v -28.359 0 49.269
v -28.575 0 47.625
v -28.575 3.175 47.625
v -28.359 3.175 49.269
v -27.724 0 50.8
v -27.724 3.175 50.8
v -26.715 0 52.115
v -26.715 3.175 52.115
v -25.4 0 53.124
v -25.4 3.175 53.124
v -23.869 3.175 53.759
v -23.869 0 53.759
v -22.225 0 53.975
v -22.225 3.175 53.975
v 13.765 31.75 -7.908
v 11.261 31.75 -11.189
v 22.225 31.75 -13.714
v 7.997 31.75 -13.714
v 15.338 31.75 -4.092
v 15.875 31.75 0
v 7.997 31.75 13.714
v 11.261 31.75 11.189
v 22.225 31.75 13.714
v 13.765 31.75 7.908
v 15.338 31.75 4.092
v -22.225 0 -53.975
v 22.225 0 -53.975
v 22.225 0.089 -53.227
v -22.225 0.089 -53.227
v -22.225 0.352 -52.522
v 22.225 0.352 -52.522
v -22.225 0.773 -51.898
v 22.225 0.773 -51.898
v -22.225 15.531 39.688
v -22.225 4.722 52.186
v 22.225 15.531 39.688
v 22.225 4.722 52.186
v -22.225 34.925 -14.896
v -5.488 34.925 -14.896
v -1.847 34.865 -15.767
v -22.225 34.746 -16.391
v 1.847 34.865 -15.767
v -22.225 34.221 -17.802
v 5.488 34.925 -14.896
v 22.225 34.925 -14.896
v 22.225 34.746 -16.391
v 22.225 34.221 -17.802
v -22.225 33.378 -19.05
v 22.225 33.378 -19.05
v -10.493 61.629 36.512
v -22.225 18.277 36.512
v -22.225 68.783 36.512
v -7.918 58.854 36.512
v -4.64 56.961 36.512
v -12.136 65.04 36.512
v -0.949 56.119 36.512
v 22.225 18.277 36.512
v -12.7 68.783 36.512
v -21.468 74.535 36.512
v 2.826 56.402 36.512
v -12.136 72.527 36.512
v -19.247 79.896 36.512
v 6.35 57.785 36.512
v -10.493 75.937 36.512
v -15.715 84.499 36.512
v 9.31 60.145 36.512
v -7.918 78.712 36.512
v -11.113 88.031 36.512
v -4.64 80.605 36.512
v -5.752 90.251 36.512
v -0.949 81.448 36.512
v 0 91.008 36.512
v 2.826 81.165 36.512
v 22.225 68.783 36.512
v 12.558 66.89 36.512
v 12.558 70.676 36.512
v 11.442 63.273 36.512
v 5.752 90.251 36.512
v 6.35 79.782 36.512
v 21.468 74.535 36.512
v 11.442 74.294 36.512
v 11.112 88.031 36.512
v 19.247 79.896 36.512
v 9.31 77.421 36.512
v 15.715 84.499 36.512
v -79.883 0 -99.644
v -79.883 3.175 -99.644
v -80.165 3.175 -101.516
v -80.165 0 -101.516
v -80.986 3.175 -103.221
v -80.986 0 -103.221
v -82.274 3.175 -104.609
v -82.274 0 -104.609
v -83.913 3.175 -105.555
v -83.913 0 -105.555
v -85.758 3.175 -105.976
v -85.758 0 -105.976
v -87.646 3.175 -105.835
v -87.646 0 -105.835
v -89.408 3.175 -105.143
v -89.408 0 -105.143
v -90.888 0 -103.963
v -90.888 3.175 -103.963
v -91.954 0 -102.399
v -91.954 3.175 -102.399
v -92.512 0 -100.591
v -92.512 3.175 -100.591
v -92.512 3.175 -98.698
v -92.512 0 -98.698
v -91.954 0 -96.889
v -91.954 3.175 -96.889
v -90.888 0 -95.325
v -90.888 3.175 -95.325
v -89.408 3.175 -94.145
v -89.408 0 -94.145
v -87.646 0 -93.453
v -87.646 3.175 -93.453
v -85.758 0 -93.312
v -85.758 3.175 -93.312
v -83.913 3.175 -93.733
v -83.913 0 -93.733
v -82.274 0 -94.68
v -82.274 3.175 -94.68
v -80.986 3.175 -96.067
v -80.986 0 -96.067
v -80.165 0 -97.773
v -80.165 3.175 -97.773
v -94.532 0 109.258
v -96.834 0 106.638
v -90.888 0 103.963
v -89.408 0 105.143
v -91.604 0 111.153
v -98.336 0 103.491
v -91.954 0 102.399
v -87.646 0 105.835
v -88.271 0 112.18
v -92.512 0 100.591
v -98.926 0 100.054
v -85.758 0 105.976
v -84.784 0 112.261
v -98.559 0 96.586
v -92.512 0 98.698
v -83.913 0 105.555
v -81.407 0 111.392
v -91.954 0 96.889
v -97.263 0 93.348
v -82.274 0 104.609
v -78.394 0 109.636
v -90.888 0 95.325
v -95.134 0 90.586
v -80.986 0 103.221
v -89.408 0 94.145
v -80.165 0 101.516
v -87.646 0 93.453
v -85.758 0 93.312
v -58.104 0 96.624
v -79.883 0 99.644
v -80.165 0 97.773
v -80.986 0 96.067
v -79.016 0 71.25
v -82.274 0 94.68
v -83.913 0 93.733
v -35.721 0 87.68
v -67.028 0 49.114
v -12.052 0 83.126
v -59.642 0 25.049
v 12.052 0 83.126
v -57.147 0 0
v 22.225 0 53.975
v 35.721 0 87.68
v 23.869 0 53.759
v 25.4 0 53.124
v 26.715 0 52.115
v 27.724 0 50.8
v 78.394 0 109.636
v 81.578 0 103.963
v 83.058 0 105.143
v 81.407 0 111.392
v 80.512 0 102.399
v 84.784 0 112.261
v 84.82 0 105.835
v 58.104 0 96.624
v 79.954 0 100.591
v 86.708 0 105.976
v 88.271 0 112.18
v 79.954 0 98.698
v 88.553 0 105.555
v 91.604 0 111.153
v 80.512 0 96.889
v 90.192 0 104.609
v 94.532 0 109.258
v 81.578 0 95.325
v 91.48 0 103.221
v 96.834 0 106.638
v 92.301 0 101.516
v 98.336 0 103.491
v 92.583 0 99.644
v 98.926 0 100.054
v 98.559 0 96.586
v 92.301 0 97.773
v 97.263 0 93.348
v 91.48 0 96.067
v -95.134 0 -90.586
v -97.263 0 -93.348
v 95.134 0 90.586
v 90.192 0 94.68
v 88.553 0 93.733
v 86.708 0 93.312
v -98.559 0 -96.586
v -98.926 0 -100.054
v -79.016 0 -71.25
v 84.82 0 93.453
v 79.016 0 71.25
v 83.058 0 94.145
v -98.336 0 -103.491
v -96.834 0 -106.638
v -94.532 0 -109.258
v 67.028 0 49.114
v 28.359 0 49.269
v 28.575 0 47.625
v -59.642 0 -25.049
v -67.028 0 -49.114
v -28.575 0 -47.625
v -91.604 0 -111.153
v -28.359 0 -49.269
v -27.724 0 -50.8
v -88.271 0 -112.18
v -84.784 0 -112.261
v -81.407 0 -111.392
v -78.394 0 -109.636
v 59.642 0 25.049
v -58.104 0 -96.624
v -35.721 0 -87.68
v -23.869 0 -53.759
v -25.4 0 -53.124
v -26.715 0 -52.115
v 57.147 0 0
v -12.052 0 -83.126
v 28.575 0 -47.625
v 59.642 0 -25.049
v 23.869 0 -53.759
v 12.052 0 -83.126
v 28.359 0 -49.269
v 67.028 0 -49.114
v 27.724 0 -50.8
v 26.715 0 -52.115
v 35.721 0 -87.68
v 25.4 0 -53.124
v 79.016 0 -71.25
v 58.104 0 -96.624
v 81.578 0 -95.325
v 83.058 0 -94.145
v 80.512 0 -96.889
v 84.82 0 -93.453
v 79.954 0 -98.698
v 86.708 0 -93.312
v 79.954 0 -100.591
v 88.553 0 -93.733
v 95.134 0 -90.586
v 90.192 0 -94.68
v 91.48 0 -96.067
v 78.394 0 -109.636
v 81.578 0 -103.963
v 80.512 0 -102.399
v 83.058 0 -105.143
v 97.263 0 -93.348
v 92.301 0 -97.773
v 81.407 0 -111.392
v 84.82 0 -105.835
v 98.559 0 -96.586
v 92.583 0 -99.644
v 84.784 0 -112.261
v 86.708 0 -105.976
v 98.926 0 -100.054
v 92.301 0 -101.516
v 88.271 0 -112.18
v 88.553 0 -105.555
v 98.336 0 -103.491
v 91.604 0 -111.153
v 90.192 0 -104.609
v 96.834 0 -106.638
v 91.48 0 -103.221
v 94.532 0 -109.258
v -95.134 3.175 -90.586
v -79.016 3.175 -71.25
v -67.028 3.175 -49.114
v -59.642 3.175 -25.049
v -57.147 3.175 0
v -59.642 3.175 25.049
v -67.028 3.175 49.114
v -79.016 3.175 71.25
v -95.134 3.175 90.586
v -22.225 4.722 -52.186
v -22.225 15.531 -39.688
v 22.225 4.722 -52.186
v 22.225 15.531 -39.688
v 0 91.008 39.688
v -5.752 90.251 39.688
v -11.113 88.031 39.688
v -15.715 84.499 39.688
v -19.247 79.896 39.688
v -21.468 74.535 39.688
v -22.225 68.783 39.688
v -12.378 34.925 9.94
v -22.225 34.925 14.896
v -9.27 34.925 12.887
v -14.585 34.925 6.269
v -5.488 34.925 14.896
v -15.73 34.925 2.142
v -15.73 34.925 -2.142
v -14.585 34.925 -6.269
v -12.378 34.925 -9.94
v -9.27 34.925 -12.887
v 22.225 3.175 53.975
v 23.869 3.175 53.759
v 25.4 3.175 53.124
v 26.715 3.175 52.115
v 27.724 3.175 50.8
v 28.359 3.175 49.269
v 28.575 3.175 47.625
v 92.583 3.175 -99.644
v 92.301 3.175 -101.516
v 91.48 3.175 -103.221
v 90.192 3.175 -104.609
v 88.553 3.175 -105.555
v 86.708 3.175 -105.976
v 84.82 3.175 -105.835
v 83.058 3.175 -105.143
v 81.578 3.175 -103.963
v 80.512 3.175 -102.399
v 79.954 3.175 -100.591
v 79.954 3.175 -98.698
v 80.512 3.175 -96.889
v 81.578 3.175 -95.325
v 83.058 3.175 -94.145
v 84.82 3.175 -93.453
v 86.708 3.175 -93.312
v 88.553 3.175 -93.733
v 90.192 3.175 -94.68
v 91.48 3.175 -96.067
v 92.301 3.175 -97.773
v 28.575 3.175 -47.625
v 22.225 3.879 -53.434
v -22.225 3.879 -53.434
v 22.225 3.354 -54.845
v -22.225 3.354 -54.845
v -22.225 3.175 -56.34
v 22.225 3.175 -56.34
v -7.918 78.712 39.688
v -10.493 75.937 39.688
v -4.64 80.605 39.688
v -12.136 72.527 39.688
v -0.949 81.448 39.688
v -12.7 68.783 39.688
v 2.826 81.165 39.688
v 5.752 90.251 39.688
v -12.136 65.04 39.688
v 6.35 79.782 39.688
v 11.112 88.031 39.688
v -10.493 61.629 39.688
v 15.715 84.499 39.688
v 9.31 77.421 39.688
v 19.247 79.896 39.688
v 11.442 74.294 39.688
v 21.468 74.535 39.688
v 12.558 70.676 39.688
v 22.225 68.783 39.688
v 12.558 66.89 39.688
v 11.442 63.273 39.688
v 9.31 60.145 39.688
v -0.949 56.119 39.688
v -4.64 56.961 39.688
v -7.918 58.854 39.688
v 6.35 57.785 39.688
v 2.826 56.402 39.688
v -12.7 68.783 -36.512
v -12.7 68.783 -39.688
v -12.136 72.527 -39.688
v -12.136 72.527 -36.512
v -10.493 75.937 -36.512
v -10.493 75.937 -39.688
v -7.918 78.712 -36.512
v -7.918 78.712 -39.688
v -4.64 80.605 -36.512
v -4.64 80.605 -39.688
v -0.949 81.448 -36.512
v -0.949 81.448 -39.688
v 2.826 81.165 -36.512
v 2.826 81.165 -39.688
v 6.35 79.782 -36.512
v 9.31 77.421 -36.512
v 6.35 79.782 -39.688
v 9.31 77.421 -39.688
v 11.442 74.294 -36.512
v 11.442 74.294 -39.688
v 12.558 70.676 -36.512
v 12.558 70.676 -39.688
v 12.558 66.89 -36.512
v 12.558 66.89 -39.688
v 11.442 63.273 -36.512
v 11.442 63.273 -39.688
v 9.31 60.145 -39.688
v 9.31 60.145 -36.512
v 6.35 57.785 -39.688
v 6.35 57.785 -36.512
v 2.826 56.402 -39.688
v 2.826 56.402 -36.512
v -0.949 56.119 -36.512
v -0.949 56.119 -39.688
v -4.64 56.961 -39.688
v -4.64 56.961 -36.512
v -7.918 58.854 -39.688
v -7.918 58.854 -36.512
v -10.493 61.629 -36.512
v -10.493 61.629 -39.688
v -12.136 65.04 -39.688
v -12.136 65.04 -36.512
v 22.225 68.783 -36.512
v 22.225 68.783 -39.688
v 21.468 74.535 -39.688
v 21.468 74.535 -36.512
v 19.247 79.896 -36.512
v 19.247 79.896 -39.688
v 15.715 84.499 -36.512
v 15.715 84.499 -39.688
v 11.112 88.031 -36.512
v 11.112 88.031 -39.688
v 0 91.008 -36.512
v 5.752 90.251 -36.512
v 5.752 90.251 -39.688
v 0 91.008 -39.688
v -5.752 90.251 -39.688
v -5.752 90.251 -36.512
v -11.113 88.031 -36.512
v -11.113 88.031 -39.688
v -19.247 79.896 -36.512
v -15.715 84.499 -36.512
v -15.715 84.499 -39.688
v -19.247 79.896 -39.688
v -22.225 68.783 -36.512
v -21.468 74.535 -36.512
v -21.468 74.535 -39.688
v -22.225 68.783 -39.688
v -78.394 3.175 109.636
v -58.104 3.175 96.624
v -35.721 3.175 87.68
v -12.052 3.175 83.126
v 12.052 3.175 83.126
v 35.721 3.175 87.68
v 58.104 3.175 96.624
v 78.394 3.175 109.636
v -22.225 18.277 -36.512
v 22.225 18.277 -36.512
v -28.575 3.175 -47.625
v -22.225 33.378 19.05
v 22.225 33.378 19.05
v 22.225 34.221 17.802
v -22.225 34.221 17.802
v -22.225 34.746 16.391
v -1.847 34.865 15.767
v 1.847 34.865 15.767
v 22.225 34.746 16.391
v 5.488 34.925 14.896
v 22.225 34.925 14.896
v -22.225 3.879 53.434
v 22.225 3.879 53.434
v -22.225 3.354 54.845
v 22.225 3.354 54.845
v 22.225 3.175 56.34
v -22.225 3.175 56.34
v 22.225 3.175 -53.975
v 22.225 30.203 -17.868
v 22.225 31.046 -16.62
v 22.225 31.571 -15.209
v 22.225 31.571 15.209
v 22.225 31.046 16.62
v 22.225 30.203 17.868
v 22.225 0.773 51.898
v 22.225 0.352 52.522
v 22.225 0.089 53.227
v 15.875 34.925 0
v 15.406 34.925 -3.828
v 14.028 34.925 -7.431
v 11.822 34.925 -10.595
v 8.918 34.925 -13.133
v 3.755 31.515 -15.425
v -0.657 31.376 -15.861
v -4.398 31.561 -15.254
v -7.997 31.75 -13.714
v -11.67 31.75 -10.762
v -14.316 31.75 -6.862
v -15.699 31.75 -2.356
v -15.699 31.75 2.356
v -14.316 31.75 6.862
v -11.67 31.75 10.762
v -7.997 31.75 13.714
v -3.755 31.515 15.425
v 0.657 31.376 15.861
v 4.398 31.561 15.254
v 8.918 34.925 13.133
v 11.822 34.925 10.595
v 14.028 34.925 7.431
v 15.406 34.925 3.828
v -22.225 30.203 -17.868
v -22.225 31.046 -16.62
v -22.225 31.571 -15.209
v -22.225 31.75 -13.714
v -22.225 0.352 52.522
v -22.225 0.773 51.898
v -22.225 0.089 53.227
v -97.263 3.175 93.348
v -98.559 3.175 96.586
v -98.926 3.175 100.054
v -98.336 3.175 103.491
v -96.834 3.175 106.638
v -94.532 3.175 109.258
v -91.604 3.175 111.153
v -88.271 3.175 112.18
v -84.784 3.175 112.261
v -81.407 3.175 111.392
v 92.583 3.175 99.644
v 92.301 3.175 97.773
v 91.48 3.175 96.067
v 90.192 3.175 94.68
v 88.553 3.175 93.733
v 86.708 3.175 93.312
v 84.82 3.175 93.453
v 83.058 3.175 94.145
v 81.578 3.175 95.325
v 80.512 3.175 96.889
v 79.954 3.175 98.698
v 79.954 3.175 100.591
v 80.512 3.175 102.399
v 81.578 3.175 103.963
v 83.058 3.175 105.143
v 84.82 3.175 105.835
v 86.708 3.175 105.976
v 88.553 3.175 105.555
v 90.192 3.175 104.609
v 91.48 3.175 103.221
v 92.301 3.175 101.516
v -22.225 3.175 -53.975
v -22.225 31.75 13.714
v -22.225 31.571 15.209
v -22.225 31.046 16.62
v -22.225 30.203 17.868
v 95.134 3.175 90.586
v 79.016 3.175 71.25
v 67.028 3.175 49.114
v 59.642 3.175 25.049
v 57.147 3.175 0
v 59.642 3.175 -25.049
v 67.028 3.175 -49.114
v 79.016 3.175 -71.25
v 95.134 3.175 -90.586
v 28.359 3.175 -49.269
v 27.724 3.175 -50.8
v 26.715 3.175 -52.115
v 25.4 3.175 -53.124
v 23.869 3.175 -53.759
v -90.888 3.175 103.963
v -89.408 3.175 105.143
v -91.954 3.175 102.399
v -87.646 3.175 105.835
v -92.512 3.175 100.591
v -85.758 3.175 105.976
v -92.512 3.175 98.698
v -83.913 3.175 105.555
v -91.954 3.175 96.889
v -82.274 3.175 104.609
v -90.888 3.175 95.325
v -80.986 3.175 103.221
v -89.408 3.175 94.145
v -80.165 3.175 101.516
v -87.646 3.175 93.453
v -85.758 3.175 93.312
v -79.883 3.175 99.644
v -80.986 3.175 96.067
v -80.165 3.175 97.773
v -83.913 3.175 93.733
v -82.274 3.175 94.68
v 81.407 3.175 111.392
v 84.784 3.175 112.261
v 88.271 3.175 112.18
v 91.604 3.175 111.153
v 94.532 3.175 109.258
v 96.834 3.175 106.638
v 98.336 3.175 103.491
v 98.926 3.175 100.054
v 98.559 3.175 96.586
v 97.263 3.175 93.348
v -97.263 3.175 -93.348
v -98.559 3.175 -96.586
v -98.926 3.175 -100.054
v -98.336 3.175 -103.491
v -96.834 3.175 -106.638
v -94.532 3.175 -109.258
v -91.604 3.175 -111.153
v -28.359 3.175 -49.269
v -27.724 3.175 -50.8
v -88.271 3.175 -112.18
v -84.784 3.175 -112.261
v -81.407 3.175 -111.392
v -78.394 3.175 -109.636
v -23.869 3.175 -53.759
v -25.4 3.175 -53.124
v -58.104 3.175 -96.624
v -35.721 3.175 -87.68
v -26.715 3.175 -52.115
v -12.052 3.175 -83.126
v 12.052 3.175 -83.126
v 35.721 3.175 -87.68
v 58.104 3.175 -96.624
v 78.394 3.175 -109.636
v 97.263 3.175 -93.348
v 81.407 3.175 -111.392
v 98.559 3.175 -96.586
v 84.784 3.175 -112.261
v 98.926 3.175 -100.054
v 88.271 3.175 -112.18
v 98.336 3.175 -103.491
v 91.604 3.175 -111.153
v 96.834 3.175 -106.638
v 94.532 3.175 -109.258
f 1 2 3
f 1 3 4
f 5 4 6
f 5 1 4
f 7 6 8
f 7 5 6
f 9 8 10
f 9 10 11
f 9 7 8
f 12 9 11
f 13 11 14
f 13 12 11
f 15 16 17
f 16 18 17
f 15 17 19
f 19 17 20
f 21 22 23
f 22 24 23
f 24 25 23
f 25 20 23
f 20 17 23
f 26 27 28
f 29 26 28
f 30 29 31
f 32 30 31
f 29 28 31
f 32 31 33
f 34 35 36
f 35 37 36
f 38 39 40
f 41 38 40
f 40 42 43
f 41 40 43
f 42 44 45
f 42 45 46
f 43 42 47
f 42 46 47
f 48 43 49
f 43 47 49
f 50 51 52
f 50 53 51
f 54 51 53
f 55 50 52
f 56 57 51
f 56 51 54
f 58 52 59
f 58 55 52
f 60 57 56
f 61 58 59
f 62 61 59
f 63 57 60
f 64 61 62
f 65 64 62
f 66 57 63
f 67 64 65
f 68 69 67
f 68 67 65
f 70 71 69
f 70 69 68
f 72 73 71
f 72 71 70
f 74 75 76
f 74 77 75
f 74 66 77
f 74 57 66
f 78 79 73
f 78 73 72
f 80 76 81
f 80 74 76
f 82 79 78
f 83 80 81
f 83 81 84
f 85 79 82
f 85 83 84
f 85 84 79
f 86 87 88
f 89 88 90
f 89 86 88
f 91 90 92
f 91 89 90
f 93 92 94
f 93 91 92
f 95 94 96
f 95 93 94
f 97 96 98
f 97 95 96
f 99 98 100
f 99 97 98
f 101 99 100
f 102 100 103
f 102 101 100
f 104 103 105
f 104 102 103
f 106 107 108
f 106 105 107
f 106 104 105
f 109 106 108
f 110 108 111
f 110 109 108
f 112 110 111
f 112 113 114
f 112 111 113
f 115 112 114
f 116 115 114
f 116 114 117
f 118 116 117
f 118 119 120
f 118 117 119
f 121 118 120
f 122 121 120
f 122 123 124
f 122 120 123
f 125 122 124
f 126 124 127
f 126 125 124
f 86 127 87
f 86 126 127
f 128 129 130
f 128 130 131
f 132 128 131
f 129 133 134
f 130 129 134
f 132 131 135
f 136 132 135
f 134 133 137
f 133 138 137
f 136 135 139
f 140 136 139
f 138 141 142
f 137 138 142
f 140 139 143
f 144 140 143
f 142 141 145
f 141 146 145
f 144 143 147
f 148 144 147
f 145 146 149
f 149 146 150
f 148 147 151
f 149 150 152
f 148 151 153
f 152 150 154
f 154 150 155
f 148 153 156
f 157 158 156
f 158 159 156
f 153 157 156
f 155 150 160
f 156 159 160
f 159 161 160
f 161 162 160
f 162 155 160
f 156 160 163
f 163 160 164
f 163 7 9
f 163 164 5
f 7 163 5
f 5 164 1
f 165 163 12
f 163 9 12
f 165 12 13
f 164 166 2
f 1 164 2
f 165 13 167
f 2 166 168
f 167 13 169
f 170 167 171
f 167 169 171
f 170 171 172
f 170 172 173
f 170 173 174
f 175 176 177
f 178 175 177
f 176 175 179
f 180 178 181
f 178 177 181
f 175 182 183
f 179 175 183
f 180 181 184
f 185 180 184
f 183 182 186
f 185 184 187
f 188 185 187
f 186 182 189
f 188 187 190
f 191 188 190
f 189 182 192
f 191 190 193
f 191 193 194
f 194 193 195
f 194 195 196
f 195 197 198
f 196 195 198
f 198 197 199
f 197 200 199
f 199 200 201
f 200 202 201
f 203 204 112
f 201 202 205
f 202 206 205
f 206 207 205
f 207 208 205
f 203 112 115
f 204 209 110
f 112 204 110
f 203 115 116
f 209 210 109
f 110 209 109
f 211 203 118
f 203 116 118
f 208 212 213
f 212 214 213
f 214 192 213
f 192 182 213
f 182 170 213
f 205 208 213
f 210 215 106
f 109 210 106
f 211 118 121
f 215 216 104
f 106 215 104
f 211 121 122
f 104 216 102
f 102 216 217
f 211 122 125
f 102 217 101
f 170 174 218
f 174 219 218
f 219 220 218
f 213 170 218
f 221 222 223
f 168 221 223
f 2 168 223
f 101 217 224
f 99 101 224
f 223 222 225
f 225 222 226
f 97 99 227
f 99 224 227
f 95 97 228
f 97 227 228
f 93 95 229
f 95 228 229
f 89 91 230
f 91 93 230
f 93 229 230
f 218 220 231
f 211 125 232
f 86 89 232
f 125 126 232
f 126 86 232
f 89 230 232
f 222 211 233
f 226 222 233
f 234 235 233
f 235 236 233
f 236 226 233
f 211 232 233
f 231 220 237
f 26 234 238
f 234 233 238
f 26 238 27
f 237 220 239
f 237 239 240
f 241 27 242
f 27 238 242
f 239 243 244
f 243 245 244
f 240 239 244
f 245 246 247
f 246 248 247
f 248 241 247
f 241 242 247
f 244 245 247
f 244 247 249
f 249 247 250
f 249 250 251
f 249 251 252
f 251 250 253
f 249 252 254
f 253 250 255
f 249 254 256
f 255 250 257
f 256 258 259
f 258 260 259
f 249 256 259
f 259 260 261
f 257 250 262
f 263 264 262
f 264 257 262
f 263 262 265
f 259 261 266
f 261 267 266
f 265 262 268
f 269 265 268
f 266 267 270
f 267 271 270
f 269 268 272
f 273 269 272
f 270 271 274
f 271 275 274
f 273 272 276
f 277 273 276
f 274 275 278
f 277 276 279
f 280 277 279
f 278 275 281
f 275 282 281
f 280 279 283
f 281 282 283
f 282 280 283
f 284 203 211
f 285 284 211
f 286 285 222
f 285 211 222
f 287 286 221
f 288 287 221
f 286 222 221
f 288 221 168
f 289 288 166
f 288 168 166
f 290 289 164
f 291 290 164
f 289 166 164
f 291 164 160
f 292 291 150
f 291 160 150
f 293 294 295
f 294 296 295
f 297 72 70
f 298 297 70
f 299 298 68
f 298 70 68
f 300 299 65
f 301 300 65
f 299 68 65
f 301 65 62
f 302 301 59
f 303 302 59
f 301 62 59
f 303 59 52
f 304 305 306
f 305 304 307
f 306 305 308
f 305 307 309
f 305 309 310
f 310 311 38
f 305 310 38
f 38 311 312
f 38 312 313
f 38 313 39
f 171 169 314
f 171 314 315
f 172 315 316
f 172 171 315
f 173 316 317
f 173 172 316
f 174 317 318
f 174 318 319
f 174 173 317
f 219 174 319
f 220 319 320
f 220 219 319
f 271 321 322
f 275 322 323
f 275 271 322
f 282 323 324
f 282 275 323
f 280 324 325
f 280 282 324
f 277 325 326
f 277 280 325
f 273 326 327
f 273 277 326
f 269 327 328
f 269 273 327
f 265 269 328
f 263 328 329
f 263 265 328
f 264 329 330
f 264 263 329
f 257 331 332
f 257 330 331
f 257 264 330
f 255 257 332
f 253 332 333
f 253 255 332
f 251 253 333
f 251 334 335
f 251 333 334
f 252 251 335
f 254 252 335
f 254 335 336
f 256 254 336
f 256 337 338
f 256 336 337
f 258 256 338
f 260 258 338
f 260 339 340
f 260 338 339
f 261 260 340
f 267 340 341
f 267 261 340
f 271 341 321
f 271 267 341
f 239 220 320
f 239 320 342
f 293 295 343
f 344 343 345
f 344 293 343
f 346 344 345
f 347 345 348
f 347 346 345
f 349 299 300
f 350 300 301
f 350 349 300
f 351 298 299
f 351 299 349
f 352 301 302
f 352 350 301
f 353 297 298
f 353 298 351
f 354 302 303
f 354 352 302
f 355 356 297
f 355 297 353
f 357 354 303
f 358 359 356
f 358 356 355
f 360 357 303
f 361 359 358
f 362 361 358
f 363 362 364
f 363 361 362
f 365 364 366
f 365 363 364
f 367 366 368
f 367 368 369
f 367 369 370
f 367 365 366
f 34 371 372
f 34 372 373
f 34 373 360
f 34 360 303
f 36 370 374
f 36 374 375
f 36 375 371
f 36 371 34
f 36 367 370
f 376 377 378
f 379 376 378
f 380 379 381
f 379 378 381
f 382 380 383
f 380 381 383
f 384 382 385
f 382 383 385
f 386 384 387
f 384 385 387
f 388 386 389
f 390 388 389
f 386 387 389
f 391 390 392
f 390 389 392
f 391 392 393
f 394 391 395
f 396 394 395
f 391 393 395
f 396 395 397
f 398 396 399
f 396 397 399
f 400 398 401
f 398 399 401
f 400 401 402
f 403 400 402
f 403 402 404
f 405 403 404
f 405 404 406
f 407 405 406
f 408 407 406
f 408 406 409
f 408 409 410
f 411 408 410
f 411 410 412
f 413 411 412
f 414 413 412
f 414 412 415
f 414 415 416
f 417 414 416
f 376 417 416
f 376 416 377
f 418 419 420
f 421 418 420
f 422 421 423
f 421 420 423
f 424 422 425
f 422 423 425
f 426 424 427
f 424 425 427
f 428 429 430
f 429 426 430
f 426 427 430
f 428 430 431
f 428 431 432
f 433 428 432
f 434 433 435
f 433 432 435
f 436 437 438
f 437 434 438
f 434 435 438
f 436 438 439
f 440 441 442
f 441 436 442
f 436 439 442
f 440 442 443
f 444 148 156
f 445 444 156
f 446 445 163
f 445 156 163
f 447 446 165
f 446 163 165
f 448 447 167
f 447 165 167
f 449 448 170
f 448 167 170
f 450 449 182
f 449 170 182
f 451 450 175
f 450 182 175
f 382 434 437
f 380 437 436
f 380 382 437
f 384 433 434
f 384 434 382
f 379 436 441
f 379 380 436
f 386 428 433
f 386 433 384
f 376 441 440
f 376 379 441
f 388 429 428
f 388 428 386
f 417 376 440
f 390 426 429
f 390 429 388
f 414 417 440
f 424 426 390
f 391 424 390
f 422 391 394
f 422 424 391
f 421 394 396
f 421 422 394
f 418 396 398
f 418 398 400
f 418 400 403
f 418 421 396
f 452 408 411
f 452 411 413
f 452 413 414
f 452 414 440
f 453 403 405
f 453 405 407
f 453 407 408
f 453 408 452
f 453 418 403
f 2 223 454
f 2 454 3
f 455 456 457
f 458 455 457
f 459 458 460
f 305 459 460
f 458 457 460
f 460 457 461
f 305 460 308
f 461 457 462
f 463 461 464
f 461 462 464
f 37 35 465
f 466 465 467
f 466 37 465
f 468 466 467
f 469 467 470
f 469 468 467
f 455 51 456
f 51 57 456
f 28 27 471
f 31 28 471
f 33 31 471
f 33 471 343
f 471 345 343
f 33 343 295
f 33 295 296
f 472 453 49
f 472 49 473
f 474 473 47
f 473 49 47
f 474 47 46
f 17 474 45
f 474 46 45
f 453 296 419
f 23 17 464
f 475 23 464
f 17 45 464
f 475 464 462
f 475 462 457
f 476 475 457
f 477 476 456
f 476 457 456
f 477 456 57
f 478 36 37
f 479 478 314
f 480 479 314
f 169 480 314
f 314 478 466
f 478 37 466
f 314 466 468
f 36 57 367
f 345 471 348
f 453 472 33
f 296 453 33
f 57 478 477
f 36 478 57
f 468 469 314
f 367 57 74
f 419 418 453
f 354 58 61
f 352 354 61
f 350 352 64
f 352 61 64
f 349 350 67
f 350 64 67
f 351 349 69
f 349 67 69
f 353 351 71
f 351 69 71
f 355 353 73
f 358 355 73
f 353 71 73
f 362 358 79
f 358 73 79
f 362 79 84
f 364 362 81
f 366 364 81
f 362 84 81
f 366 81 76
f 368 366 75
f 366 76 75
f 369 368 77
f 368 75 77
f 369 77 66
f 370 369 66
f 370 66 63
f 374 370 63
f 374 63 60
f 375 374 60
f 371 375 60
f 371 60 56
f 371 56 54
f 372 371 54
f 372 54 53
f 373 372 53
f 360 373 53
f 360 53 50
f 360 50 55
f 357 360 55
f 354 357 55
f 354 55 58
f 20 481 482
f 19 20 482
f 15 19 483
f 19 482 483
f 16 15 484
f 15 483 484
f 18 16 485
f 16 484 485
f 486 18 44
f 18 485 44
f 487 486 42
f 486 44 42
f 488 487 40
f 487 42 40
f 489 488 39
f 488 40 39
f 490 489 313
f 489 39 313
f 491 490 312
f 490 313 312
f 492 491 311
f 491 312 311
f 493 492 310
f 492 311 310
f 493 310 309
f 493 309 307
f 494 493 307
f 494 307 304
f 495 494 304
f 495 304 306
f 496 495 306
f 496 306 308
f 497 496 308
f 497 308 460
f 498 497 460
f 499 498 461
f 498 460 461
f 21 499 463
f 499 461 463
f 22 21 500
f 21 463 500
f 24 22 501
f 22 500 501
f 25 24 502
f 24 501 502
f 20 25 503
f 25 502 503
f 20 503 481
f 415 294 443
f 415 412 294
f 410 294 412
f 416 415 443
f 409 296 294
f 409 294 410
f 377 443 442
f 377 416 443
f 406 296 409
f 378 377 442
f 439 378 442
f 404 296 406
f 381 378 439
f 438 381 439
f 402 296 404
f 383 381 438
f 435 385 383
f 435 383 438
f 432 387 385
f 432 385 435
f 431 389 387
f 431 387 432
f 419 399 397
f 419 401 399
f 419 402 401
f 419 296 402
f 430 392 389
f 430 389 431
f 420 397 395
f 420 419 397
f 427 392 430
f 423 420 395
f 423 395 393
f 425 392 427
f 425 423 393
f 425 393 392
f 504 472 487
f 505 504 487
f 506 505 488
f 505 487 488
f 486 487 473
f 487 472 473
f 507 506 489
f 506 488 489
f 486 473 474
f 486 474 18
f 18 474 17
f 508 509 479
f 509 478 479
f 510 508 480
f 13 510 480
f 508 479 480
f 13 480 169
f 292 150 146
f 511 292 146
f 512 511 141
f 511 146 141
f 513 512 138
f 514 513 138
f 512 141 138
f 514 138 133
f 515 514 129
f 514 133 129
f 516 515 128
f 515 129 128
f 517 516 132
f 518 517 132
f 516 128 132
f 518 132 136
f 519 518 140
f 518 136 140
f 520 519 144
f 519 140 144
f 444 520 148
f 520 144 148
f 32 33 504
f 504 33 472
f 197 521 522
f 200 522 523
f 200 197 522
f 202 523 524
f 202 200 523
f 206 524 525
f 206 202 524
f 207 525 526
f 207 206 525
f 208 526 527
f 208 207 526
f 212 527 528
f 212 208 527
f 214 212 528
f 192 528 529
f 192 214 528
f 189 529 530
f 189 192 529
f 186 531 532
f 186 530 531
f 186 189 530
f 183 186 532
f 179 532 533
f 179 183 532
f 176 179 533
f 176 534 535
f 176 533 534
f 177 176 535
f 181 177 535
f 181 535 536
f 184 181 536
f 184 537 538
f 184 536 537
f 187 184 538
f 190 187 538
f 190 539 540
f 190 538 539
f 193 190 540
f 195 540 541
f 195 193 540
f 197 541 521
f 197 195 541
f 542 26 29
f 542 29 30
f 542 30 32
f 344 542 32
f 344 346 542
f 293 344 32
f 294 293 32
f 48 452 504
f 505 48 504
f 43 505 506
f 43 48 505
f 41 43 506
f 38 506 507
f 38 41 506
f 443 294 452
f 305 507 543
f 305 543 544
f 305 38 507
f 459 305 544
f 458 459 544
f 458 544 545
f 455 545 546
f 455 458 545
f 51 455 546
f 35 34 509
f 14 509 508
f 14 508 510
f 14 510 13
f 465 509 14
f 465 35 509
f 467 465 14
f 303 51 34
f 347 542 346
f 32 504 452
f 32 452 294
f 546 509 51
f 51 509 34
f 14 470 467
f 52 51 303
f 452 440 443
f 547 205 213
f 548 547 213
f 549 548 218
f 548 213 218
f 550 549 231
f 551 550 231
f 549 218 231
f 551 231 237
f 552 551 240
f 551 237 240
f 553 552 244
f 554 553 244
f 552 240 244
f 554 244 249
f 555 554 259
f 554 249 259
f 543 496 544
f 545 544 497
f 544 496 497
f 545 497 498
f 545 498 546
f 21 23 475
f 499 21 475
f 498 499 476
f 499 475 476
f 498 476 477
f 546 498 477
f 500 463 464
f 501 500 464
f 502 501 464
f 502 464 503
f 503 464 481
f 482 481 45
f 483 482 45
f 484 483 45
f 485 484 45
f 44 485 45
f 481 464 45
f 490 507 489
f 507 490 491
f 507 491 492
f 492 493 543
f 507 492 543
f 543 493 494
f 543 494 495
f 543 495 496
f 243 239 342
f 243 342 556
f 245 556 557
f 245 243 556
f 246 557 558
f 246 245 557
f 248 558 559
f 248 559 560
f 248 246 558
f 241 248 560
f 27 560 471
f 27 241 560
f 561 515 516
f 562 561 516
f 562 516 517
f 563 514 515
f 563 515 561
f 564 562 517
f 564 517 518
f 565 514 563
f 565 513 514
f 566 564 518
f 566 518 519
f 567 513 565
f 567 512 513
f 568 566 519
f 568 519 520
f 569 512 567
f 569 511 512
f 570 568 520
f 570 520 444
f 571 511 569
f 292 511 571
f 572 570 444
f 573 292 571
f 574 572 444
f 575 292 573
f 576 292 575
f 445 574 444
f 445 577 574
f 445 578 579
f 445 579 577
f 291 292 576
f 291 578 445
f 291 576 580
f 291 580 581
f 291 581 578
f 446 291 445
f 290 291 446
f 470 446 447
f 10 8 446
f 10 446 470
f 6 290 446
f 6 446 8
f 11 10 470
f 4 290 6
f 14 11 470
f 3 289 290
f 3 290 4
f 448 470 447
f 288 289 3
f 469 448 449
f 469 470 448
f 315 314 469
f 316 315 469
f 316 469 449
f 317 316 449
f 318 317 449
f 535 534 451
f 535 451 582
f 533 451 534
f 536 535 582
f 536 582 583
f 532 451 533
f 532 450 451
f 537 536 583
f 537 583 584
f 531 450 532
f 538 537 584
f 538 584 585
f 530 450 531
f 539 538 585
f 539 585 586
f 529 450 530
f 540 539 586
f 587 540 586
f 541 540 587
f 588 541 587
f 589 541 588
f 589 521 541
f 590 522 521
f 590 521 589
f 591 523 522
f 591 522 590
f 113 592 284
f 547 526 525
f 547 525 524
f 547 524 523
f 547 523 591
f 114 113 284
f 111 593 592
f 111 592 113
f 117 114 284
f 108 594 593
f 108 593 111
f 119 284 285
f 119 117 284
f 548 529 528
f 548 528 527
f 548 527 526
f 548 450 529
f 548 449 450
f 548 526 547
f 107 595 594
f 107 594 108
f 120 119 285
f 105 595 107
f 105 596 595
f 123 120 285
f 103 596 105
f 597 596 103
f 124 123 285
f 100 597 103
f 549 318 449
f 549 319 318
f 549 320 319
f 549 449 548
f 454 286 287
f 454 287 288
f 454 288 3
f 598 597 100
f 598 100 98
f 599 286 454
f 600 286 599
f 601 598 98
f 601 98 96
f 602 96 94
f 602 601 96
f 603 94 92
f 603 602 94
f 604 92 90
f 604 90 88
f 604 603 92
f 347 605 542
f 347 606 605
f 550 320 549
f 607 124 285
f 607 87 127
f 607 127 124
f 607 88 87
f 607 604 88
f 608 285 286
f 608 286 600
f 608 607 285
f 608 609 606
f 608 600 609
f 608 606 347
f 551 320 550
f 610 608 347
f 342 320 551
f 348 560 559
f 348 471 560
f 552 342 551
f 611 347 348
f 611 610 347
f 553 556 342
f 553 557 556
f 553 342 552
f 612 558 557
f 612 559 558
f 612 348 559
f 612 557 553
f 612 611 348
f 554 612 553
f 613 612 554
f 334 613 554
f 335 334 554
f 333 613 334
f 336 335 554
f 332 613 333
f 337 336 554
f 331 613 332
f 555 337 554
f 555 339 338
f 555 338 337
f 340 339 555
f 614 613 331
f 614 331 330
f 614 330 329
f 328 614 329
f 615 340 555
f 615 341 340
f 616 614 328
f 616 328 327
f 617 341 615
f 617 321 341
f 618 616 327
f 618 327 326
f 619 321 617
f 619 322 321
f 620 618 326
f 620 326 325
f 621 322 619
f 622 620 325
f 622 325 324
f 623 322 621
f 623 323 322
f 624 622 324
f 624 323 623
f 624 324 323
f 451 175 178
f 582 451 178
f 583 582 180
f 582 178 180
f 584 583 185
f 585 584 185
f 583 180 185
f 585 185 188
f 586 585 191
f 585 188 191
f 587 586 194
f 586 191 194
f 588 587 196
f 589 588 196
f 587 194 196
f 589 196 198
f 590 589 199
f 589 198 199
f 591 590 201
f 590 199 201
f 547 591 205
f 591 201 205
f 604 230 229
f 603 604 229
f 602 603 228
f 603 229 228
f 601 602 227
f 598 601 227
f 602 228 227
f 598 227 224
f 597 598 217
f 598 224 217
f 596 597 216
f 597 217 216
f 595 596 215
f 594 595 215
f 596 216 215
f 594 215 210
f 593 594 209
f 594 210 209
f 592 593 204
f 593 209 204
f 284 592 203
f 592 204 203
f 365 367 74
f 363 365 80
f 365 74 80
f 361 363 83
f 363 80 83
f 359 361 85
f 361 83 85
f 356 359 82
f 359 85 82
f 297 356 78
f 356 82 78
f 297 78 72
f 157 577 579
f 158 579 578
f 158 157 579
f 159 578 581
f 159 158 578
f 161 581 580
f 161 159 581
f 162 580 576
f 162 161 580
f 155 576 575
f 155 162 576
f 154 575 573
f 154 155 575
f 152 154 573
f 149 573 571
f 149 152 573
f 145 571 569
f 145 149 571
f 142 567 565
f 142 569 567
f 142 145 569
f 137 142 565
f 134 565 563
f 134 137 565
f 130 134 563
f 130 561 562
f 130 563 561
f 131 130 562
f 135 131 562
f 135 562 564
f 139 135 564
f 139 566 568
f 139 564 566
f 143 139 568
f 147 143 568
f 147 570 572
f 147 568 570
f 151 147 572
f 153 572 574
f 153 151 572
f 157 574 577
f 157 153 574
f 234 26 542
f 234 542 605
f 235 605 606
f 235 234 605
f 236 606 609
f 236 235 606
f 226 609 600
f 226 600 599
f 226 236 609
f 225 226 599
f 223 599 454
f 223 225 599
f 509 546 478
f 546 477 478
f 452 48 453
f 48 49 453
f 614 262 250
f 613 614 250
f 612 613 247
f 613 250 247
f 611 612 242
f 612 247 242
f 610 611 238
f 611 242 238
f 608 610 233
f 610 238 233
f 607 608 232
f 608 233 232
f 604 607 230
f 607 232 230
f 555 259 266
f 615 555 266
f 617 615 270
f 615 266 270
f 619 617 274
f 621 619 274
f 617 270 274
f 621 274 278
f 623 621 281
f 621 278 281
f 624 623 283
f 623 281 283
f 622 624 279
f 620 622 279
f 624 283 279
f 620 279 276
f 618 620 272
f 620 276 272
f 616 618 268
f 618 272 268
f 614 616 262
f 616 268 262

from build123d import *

# Parameters (mm, degrees)
BOSS_EXTRUDE1_DEPTH = 3.175
BOSS_EXTRUDE3_DEPTH = 22.225
SKETCH5_R           = 15.875
CUT_EXTRUDE1_DEPTH  = 35.925
SKETCH6_R           = 12.7
CUT_EXTRUDE2_DEPTH  = 79.375
FILLET1_R           = 6.35
SKETCH1_5_R         = 6.35
HOLES_DEPTH         = 92.0082


with BuildPart() as part:
    # Sketch1 → Boss-Extrude1 (new body)
    with BuildSketch(Plane(origin=(0, 0, 0), x_dir=(1, 0, 0), z_dir=(0, 1, 0))):
        with BuildLine():
            ThreePointArc((-78.393636364, 109.635915457), (-95.772926059, 108.027505481), (-95.134259734, 90.585636364))
            ThreePointArc((-95.134259734, 90.585636364), (-57.14685707, 0), (-95.134259734, -90.585636364))
            ThreePointArc((-95.134259734, -90.585636364), (-95.772926059, -108.027505481), (-78.393636364, -109.635915457))
            ThreePointArc((-78.393636364, -109.635915457), (0, -82.553070029), (78.393636364, -109.635915457))
            ThreePointArc((78.393636364, -109.635915457), (95.772926059, -108.027505481), (95.134259734, -90.585636364))
            ThreePointArc((95.134259734, -90.585636364), (57.14685707, 0), (95.134259734, 90.585636364))
            ThreePointArc((95.134259734, 90.585636364), (95.772926059, 108.027505481), (78.393636364, 109.635915457))
            ThreePointArc((78.393636364, 109.635915457), (0, 82.553070029), (-78.393636364, 109.635915457))
        make_face()
        with BuildLine():
            Line((-22.225, -53.975), (22.225, -53.975))
            ThreePointArc((22.225, -53.975), (26.715128061, -52.115128061), (28.575, -47.625))
            Line((28.575, -47.625), (28.575, 47.625))
            ThreePointArc((28.575, 47.625), (26.715128061, 52.115128061), (22.225, 53.975))
            Line((22.225, 53.975), (-22.225, 53.975))
            ThreePointArc((-22.225, 53.975), (-26.715128061, 52.115128061), (-28.575, 47.625))
            Line((-28.575, 47.625), (-28.575, -47.625))
            ThreePointArc((-28.575, -47.625), (-26.715128061, -52.115128061), (-22.225, -53.975))
        make_face(mode=Mode.SUBTRACT)
    extrude(amount=BOSS_EXTRUDE1_DEPTH)

    # Sketch4 → Boss-Extrude3 (add, symmetric)
    with BuildSketch(Plane(origin=(0, 0, 0), x_dir=(0, 0, -1), z_dir=(1, 0, 0))):
        with BuildLine():
            ThreePointArc((53.975, 0), (52.866902818, 0.199643612), (51.898159667, 0.773467316))
            Line((51.898159667, 0.773467316), (17.867550541, 30.203065368))
            ThreePointArc((17.867550541, 30.203065368), (15.930064238, 31.350712776), (13.713869875, 31.75))
            Line((13.713869875, 31.75), (-13.713869875, 31.75))
            ThreePointArc((-13.713869875, 31.75), (-15.930064238, 31.350712776), (-17.867550541, 30.203065368))
            Line((-17.867550541, 30.203065368), (-51.898159667, 0.773467316))
            ThreePointArc((-51.898159667, 0.773467316), (-52.866902818, 0.199643612), (-53.975, 0))
            Line((-53.975, 0), (-53.975, 3.175))
            Line((-53.975, 3.175), (-19.05, 33.378065368))
            ThreePointArc((-19.05, 33.378065368), (-17.112513698, 34.525712776), (-14.896319334, 34.925))
            Line((-14.896319334, 34.925), (14.896319334, 34.925))
            ThreePointArc((14.896319334, 34.925), (17.112513698, 34.525712776), (19.05, 33.378065368))
            Line((19.05, 33.378065368), (53.975, 3.175))
            Line((53.975, 3.175), (53.975, 0))
        make_face()
        Polygon((-39.6875, 91.0082), (-39.6875, 15.530799469), (-36.5125, 18.276532684), (-36.5125, 91.0082), align=None)
        Polygon((36.5125, 91.0082), (36.5125, 18.276532684), (39.6875, 15.530799469), (39.6875, 91.0082), align=None)
    extrude(amount=BOSS_EXTRUDE3_DEPTH, both=True)

    # Sketch5 → Cut-Extrude1 (cut, through all)
    with BuildSketch(Plane(origin=(0, 34.925, 0), x_dir=(1, 0, 0), z_dir=(0, 1, 0))):
        Circle(SKETCH5_R)
    extrude(amount=-CUT_EXTRUDE1_DEPTH, mode=Mode.SUBTRACT)

    # Sketch6 → Cut-Extrude2 (cut)
    with BuildSketch(Plane(origin=(0, 0, -39.6875), x_dir=(-1, 0, 0), z_dir=(0, 0, -1))):
        with Locations((0, 68.7832)):
            Circle(SKETCH6_R)
        with BuildLine():
            ThreePointArc((-22.225, 68.7832), (-15.715448152, 84.498648271), (1.69e-07, 91.0082))
            Line((1.69e-07, 91.0082), (-22.225, 91.0082))
            Line((-22.225, 91.0082), (-22.225, 68.7832))
        make_face()
        with BuildLine():
            Line((22.225, 68.7832), (22.225, 91.0082))
            Line((22.225, 91.0082), (1.69e-07, 91.0082))
            ThreePointArc((1.69e-07, 91.0082), (15.715448271, 84.498648152), (22.225, 68.7832))
        make_face()
    extrude(amount=-CUT_EXTRUDE2_DEPTH, mode=Mode.SUBTRACT)

    # Fillet1
    fillet1_edges = [part.edges().sort_by_distance(p)[0] for p in [
        (0, 3.175, -53.975),
        (0, 3.175, 53.975),
    ]]
    fillet(fillet1_edges, radius=FILLET1_R)

    # Sketch1<5> → holes (cut, through all)
    with BuildSketch(Plane(origin=(0, 0, 0), x_dir=(1, 0, 0), z_dir=(0, 1, 0))):
        with Locations((-86.233, 99.6442)):
            Circle(SKETCH1_5_R)
        with Locations((86.233, 99.6442)):
            Circle(SKETCH1_5_R)
        with Locations((86.233, -99.6442)):
            Circle(SKETCH1_5_R)
        with Locations((-86.233, -99.6442)):
            Circle(SKETCH1_5_R)
    extrude(amount=HOLES_DEPTH, mode=Mode.SUBTRACT)


solid = part.part
